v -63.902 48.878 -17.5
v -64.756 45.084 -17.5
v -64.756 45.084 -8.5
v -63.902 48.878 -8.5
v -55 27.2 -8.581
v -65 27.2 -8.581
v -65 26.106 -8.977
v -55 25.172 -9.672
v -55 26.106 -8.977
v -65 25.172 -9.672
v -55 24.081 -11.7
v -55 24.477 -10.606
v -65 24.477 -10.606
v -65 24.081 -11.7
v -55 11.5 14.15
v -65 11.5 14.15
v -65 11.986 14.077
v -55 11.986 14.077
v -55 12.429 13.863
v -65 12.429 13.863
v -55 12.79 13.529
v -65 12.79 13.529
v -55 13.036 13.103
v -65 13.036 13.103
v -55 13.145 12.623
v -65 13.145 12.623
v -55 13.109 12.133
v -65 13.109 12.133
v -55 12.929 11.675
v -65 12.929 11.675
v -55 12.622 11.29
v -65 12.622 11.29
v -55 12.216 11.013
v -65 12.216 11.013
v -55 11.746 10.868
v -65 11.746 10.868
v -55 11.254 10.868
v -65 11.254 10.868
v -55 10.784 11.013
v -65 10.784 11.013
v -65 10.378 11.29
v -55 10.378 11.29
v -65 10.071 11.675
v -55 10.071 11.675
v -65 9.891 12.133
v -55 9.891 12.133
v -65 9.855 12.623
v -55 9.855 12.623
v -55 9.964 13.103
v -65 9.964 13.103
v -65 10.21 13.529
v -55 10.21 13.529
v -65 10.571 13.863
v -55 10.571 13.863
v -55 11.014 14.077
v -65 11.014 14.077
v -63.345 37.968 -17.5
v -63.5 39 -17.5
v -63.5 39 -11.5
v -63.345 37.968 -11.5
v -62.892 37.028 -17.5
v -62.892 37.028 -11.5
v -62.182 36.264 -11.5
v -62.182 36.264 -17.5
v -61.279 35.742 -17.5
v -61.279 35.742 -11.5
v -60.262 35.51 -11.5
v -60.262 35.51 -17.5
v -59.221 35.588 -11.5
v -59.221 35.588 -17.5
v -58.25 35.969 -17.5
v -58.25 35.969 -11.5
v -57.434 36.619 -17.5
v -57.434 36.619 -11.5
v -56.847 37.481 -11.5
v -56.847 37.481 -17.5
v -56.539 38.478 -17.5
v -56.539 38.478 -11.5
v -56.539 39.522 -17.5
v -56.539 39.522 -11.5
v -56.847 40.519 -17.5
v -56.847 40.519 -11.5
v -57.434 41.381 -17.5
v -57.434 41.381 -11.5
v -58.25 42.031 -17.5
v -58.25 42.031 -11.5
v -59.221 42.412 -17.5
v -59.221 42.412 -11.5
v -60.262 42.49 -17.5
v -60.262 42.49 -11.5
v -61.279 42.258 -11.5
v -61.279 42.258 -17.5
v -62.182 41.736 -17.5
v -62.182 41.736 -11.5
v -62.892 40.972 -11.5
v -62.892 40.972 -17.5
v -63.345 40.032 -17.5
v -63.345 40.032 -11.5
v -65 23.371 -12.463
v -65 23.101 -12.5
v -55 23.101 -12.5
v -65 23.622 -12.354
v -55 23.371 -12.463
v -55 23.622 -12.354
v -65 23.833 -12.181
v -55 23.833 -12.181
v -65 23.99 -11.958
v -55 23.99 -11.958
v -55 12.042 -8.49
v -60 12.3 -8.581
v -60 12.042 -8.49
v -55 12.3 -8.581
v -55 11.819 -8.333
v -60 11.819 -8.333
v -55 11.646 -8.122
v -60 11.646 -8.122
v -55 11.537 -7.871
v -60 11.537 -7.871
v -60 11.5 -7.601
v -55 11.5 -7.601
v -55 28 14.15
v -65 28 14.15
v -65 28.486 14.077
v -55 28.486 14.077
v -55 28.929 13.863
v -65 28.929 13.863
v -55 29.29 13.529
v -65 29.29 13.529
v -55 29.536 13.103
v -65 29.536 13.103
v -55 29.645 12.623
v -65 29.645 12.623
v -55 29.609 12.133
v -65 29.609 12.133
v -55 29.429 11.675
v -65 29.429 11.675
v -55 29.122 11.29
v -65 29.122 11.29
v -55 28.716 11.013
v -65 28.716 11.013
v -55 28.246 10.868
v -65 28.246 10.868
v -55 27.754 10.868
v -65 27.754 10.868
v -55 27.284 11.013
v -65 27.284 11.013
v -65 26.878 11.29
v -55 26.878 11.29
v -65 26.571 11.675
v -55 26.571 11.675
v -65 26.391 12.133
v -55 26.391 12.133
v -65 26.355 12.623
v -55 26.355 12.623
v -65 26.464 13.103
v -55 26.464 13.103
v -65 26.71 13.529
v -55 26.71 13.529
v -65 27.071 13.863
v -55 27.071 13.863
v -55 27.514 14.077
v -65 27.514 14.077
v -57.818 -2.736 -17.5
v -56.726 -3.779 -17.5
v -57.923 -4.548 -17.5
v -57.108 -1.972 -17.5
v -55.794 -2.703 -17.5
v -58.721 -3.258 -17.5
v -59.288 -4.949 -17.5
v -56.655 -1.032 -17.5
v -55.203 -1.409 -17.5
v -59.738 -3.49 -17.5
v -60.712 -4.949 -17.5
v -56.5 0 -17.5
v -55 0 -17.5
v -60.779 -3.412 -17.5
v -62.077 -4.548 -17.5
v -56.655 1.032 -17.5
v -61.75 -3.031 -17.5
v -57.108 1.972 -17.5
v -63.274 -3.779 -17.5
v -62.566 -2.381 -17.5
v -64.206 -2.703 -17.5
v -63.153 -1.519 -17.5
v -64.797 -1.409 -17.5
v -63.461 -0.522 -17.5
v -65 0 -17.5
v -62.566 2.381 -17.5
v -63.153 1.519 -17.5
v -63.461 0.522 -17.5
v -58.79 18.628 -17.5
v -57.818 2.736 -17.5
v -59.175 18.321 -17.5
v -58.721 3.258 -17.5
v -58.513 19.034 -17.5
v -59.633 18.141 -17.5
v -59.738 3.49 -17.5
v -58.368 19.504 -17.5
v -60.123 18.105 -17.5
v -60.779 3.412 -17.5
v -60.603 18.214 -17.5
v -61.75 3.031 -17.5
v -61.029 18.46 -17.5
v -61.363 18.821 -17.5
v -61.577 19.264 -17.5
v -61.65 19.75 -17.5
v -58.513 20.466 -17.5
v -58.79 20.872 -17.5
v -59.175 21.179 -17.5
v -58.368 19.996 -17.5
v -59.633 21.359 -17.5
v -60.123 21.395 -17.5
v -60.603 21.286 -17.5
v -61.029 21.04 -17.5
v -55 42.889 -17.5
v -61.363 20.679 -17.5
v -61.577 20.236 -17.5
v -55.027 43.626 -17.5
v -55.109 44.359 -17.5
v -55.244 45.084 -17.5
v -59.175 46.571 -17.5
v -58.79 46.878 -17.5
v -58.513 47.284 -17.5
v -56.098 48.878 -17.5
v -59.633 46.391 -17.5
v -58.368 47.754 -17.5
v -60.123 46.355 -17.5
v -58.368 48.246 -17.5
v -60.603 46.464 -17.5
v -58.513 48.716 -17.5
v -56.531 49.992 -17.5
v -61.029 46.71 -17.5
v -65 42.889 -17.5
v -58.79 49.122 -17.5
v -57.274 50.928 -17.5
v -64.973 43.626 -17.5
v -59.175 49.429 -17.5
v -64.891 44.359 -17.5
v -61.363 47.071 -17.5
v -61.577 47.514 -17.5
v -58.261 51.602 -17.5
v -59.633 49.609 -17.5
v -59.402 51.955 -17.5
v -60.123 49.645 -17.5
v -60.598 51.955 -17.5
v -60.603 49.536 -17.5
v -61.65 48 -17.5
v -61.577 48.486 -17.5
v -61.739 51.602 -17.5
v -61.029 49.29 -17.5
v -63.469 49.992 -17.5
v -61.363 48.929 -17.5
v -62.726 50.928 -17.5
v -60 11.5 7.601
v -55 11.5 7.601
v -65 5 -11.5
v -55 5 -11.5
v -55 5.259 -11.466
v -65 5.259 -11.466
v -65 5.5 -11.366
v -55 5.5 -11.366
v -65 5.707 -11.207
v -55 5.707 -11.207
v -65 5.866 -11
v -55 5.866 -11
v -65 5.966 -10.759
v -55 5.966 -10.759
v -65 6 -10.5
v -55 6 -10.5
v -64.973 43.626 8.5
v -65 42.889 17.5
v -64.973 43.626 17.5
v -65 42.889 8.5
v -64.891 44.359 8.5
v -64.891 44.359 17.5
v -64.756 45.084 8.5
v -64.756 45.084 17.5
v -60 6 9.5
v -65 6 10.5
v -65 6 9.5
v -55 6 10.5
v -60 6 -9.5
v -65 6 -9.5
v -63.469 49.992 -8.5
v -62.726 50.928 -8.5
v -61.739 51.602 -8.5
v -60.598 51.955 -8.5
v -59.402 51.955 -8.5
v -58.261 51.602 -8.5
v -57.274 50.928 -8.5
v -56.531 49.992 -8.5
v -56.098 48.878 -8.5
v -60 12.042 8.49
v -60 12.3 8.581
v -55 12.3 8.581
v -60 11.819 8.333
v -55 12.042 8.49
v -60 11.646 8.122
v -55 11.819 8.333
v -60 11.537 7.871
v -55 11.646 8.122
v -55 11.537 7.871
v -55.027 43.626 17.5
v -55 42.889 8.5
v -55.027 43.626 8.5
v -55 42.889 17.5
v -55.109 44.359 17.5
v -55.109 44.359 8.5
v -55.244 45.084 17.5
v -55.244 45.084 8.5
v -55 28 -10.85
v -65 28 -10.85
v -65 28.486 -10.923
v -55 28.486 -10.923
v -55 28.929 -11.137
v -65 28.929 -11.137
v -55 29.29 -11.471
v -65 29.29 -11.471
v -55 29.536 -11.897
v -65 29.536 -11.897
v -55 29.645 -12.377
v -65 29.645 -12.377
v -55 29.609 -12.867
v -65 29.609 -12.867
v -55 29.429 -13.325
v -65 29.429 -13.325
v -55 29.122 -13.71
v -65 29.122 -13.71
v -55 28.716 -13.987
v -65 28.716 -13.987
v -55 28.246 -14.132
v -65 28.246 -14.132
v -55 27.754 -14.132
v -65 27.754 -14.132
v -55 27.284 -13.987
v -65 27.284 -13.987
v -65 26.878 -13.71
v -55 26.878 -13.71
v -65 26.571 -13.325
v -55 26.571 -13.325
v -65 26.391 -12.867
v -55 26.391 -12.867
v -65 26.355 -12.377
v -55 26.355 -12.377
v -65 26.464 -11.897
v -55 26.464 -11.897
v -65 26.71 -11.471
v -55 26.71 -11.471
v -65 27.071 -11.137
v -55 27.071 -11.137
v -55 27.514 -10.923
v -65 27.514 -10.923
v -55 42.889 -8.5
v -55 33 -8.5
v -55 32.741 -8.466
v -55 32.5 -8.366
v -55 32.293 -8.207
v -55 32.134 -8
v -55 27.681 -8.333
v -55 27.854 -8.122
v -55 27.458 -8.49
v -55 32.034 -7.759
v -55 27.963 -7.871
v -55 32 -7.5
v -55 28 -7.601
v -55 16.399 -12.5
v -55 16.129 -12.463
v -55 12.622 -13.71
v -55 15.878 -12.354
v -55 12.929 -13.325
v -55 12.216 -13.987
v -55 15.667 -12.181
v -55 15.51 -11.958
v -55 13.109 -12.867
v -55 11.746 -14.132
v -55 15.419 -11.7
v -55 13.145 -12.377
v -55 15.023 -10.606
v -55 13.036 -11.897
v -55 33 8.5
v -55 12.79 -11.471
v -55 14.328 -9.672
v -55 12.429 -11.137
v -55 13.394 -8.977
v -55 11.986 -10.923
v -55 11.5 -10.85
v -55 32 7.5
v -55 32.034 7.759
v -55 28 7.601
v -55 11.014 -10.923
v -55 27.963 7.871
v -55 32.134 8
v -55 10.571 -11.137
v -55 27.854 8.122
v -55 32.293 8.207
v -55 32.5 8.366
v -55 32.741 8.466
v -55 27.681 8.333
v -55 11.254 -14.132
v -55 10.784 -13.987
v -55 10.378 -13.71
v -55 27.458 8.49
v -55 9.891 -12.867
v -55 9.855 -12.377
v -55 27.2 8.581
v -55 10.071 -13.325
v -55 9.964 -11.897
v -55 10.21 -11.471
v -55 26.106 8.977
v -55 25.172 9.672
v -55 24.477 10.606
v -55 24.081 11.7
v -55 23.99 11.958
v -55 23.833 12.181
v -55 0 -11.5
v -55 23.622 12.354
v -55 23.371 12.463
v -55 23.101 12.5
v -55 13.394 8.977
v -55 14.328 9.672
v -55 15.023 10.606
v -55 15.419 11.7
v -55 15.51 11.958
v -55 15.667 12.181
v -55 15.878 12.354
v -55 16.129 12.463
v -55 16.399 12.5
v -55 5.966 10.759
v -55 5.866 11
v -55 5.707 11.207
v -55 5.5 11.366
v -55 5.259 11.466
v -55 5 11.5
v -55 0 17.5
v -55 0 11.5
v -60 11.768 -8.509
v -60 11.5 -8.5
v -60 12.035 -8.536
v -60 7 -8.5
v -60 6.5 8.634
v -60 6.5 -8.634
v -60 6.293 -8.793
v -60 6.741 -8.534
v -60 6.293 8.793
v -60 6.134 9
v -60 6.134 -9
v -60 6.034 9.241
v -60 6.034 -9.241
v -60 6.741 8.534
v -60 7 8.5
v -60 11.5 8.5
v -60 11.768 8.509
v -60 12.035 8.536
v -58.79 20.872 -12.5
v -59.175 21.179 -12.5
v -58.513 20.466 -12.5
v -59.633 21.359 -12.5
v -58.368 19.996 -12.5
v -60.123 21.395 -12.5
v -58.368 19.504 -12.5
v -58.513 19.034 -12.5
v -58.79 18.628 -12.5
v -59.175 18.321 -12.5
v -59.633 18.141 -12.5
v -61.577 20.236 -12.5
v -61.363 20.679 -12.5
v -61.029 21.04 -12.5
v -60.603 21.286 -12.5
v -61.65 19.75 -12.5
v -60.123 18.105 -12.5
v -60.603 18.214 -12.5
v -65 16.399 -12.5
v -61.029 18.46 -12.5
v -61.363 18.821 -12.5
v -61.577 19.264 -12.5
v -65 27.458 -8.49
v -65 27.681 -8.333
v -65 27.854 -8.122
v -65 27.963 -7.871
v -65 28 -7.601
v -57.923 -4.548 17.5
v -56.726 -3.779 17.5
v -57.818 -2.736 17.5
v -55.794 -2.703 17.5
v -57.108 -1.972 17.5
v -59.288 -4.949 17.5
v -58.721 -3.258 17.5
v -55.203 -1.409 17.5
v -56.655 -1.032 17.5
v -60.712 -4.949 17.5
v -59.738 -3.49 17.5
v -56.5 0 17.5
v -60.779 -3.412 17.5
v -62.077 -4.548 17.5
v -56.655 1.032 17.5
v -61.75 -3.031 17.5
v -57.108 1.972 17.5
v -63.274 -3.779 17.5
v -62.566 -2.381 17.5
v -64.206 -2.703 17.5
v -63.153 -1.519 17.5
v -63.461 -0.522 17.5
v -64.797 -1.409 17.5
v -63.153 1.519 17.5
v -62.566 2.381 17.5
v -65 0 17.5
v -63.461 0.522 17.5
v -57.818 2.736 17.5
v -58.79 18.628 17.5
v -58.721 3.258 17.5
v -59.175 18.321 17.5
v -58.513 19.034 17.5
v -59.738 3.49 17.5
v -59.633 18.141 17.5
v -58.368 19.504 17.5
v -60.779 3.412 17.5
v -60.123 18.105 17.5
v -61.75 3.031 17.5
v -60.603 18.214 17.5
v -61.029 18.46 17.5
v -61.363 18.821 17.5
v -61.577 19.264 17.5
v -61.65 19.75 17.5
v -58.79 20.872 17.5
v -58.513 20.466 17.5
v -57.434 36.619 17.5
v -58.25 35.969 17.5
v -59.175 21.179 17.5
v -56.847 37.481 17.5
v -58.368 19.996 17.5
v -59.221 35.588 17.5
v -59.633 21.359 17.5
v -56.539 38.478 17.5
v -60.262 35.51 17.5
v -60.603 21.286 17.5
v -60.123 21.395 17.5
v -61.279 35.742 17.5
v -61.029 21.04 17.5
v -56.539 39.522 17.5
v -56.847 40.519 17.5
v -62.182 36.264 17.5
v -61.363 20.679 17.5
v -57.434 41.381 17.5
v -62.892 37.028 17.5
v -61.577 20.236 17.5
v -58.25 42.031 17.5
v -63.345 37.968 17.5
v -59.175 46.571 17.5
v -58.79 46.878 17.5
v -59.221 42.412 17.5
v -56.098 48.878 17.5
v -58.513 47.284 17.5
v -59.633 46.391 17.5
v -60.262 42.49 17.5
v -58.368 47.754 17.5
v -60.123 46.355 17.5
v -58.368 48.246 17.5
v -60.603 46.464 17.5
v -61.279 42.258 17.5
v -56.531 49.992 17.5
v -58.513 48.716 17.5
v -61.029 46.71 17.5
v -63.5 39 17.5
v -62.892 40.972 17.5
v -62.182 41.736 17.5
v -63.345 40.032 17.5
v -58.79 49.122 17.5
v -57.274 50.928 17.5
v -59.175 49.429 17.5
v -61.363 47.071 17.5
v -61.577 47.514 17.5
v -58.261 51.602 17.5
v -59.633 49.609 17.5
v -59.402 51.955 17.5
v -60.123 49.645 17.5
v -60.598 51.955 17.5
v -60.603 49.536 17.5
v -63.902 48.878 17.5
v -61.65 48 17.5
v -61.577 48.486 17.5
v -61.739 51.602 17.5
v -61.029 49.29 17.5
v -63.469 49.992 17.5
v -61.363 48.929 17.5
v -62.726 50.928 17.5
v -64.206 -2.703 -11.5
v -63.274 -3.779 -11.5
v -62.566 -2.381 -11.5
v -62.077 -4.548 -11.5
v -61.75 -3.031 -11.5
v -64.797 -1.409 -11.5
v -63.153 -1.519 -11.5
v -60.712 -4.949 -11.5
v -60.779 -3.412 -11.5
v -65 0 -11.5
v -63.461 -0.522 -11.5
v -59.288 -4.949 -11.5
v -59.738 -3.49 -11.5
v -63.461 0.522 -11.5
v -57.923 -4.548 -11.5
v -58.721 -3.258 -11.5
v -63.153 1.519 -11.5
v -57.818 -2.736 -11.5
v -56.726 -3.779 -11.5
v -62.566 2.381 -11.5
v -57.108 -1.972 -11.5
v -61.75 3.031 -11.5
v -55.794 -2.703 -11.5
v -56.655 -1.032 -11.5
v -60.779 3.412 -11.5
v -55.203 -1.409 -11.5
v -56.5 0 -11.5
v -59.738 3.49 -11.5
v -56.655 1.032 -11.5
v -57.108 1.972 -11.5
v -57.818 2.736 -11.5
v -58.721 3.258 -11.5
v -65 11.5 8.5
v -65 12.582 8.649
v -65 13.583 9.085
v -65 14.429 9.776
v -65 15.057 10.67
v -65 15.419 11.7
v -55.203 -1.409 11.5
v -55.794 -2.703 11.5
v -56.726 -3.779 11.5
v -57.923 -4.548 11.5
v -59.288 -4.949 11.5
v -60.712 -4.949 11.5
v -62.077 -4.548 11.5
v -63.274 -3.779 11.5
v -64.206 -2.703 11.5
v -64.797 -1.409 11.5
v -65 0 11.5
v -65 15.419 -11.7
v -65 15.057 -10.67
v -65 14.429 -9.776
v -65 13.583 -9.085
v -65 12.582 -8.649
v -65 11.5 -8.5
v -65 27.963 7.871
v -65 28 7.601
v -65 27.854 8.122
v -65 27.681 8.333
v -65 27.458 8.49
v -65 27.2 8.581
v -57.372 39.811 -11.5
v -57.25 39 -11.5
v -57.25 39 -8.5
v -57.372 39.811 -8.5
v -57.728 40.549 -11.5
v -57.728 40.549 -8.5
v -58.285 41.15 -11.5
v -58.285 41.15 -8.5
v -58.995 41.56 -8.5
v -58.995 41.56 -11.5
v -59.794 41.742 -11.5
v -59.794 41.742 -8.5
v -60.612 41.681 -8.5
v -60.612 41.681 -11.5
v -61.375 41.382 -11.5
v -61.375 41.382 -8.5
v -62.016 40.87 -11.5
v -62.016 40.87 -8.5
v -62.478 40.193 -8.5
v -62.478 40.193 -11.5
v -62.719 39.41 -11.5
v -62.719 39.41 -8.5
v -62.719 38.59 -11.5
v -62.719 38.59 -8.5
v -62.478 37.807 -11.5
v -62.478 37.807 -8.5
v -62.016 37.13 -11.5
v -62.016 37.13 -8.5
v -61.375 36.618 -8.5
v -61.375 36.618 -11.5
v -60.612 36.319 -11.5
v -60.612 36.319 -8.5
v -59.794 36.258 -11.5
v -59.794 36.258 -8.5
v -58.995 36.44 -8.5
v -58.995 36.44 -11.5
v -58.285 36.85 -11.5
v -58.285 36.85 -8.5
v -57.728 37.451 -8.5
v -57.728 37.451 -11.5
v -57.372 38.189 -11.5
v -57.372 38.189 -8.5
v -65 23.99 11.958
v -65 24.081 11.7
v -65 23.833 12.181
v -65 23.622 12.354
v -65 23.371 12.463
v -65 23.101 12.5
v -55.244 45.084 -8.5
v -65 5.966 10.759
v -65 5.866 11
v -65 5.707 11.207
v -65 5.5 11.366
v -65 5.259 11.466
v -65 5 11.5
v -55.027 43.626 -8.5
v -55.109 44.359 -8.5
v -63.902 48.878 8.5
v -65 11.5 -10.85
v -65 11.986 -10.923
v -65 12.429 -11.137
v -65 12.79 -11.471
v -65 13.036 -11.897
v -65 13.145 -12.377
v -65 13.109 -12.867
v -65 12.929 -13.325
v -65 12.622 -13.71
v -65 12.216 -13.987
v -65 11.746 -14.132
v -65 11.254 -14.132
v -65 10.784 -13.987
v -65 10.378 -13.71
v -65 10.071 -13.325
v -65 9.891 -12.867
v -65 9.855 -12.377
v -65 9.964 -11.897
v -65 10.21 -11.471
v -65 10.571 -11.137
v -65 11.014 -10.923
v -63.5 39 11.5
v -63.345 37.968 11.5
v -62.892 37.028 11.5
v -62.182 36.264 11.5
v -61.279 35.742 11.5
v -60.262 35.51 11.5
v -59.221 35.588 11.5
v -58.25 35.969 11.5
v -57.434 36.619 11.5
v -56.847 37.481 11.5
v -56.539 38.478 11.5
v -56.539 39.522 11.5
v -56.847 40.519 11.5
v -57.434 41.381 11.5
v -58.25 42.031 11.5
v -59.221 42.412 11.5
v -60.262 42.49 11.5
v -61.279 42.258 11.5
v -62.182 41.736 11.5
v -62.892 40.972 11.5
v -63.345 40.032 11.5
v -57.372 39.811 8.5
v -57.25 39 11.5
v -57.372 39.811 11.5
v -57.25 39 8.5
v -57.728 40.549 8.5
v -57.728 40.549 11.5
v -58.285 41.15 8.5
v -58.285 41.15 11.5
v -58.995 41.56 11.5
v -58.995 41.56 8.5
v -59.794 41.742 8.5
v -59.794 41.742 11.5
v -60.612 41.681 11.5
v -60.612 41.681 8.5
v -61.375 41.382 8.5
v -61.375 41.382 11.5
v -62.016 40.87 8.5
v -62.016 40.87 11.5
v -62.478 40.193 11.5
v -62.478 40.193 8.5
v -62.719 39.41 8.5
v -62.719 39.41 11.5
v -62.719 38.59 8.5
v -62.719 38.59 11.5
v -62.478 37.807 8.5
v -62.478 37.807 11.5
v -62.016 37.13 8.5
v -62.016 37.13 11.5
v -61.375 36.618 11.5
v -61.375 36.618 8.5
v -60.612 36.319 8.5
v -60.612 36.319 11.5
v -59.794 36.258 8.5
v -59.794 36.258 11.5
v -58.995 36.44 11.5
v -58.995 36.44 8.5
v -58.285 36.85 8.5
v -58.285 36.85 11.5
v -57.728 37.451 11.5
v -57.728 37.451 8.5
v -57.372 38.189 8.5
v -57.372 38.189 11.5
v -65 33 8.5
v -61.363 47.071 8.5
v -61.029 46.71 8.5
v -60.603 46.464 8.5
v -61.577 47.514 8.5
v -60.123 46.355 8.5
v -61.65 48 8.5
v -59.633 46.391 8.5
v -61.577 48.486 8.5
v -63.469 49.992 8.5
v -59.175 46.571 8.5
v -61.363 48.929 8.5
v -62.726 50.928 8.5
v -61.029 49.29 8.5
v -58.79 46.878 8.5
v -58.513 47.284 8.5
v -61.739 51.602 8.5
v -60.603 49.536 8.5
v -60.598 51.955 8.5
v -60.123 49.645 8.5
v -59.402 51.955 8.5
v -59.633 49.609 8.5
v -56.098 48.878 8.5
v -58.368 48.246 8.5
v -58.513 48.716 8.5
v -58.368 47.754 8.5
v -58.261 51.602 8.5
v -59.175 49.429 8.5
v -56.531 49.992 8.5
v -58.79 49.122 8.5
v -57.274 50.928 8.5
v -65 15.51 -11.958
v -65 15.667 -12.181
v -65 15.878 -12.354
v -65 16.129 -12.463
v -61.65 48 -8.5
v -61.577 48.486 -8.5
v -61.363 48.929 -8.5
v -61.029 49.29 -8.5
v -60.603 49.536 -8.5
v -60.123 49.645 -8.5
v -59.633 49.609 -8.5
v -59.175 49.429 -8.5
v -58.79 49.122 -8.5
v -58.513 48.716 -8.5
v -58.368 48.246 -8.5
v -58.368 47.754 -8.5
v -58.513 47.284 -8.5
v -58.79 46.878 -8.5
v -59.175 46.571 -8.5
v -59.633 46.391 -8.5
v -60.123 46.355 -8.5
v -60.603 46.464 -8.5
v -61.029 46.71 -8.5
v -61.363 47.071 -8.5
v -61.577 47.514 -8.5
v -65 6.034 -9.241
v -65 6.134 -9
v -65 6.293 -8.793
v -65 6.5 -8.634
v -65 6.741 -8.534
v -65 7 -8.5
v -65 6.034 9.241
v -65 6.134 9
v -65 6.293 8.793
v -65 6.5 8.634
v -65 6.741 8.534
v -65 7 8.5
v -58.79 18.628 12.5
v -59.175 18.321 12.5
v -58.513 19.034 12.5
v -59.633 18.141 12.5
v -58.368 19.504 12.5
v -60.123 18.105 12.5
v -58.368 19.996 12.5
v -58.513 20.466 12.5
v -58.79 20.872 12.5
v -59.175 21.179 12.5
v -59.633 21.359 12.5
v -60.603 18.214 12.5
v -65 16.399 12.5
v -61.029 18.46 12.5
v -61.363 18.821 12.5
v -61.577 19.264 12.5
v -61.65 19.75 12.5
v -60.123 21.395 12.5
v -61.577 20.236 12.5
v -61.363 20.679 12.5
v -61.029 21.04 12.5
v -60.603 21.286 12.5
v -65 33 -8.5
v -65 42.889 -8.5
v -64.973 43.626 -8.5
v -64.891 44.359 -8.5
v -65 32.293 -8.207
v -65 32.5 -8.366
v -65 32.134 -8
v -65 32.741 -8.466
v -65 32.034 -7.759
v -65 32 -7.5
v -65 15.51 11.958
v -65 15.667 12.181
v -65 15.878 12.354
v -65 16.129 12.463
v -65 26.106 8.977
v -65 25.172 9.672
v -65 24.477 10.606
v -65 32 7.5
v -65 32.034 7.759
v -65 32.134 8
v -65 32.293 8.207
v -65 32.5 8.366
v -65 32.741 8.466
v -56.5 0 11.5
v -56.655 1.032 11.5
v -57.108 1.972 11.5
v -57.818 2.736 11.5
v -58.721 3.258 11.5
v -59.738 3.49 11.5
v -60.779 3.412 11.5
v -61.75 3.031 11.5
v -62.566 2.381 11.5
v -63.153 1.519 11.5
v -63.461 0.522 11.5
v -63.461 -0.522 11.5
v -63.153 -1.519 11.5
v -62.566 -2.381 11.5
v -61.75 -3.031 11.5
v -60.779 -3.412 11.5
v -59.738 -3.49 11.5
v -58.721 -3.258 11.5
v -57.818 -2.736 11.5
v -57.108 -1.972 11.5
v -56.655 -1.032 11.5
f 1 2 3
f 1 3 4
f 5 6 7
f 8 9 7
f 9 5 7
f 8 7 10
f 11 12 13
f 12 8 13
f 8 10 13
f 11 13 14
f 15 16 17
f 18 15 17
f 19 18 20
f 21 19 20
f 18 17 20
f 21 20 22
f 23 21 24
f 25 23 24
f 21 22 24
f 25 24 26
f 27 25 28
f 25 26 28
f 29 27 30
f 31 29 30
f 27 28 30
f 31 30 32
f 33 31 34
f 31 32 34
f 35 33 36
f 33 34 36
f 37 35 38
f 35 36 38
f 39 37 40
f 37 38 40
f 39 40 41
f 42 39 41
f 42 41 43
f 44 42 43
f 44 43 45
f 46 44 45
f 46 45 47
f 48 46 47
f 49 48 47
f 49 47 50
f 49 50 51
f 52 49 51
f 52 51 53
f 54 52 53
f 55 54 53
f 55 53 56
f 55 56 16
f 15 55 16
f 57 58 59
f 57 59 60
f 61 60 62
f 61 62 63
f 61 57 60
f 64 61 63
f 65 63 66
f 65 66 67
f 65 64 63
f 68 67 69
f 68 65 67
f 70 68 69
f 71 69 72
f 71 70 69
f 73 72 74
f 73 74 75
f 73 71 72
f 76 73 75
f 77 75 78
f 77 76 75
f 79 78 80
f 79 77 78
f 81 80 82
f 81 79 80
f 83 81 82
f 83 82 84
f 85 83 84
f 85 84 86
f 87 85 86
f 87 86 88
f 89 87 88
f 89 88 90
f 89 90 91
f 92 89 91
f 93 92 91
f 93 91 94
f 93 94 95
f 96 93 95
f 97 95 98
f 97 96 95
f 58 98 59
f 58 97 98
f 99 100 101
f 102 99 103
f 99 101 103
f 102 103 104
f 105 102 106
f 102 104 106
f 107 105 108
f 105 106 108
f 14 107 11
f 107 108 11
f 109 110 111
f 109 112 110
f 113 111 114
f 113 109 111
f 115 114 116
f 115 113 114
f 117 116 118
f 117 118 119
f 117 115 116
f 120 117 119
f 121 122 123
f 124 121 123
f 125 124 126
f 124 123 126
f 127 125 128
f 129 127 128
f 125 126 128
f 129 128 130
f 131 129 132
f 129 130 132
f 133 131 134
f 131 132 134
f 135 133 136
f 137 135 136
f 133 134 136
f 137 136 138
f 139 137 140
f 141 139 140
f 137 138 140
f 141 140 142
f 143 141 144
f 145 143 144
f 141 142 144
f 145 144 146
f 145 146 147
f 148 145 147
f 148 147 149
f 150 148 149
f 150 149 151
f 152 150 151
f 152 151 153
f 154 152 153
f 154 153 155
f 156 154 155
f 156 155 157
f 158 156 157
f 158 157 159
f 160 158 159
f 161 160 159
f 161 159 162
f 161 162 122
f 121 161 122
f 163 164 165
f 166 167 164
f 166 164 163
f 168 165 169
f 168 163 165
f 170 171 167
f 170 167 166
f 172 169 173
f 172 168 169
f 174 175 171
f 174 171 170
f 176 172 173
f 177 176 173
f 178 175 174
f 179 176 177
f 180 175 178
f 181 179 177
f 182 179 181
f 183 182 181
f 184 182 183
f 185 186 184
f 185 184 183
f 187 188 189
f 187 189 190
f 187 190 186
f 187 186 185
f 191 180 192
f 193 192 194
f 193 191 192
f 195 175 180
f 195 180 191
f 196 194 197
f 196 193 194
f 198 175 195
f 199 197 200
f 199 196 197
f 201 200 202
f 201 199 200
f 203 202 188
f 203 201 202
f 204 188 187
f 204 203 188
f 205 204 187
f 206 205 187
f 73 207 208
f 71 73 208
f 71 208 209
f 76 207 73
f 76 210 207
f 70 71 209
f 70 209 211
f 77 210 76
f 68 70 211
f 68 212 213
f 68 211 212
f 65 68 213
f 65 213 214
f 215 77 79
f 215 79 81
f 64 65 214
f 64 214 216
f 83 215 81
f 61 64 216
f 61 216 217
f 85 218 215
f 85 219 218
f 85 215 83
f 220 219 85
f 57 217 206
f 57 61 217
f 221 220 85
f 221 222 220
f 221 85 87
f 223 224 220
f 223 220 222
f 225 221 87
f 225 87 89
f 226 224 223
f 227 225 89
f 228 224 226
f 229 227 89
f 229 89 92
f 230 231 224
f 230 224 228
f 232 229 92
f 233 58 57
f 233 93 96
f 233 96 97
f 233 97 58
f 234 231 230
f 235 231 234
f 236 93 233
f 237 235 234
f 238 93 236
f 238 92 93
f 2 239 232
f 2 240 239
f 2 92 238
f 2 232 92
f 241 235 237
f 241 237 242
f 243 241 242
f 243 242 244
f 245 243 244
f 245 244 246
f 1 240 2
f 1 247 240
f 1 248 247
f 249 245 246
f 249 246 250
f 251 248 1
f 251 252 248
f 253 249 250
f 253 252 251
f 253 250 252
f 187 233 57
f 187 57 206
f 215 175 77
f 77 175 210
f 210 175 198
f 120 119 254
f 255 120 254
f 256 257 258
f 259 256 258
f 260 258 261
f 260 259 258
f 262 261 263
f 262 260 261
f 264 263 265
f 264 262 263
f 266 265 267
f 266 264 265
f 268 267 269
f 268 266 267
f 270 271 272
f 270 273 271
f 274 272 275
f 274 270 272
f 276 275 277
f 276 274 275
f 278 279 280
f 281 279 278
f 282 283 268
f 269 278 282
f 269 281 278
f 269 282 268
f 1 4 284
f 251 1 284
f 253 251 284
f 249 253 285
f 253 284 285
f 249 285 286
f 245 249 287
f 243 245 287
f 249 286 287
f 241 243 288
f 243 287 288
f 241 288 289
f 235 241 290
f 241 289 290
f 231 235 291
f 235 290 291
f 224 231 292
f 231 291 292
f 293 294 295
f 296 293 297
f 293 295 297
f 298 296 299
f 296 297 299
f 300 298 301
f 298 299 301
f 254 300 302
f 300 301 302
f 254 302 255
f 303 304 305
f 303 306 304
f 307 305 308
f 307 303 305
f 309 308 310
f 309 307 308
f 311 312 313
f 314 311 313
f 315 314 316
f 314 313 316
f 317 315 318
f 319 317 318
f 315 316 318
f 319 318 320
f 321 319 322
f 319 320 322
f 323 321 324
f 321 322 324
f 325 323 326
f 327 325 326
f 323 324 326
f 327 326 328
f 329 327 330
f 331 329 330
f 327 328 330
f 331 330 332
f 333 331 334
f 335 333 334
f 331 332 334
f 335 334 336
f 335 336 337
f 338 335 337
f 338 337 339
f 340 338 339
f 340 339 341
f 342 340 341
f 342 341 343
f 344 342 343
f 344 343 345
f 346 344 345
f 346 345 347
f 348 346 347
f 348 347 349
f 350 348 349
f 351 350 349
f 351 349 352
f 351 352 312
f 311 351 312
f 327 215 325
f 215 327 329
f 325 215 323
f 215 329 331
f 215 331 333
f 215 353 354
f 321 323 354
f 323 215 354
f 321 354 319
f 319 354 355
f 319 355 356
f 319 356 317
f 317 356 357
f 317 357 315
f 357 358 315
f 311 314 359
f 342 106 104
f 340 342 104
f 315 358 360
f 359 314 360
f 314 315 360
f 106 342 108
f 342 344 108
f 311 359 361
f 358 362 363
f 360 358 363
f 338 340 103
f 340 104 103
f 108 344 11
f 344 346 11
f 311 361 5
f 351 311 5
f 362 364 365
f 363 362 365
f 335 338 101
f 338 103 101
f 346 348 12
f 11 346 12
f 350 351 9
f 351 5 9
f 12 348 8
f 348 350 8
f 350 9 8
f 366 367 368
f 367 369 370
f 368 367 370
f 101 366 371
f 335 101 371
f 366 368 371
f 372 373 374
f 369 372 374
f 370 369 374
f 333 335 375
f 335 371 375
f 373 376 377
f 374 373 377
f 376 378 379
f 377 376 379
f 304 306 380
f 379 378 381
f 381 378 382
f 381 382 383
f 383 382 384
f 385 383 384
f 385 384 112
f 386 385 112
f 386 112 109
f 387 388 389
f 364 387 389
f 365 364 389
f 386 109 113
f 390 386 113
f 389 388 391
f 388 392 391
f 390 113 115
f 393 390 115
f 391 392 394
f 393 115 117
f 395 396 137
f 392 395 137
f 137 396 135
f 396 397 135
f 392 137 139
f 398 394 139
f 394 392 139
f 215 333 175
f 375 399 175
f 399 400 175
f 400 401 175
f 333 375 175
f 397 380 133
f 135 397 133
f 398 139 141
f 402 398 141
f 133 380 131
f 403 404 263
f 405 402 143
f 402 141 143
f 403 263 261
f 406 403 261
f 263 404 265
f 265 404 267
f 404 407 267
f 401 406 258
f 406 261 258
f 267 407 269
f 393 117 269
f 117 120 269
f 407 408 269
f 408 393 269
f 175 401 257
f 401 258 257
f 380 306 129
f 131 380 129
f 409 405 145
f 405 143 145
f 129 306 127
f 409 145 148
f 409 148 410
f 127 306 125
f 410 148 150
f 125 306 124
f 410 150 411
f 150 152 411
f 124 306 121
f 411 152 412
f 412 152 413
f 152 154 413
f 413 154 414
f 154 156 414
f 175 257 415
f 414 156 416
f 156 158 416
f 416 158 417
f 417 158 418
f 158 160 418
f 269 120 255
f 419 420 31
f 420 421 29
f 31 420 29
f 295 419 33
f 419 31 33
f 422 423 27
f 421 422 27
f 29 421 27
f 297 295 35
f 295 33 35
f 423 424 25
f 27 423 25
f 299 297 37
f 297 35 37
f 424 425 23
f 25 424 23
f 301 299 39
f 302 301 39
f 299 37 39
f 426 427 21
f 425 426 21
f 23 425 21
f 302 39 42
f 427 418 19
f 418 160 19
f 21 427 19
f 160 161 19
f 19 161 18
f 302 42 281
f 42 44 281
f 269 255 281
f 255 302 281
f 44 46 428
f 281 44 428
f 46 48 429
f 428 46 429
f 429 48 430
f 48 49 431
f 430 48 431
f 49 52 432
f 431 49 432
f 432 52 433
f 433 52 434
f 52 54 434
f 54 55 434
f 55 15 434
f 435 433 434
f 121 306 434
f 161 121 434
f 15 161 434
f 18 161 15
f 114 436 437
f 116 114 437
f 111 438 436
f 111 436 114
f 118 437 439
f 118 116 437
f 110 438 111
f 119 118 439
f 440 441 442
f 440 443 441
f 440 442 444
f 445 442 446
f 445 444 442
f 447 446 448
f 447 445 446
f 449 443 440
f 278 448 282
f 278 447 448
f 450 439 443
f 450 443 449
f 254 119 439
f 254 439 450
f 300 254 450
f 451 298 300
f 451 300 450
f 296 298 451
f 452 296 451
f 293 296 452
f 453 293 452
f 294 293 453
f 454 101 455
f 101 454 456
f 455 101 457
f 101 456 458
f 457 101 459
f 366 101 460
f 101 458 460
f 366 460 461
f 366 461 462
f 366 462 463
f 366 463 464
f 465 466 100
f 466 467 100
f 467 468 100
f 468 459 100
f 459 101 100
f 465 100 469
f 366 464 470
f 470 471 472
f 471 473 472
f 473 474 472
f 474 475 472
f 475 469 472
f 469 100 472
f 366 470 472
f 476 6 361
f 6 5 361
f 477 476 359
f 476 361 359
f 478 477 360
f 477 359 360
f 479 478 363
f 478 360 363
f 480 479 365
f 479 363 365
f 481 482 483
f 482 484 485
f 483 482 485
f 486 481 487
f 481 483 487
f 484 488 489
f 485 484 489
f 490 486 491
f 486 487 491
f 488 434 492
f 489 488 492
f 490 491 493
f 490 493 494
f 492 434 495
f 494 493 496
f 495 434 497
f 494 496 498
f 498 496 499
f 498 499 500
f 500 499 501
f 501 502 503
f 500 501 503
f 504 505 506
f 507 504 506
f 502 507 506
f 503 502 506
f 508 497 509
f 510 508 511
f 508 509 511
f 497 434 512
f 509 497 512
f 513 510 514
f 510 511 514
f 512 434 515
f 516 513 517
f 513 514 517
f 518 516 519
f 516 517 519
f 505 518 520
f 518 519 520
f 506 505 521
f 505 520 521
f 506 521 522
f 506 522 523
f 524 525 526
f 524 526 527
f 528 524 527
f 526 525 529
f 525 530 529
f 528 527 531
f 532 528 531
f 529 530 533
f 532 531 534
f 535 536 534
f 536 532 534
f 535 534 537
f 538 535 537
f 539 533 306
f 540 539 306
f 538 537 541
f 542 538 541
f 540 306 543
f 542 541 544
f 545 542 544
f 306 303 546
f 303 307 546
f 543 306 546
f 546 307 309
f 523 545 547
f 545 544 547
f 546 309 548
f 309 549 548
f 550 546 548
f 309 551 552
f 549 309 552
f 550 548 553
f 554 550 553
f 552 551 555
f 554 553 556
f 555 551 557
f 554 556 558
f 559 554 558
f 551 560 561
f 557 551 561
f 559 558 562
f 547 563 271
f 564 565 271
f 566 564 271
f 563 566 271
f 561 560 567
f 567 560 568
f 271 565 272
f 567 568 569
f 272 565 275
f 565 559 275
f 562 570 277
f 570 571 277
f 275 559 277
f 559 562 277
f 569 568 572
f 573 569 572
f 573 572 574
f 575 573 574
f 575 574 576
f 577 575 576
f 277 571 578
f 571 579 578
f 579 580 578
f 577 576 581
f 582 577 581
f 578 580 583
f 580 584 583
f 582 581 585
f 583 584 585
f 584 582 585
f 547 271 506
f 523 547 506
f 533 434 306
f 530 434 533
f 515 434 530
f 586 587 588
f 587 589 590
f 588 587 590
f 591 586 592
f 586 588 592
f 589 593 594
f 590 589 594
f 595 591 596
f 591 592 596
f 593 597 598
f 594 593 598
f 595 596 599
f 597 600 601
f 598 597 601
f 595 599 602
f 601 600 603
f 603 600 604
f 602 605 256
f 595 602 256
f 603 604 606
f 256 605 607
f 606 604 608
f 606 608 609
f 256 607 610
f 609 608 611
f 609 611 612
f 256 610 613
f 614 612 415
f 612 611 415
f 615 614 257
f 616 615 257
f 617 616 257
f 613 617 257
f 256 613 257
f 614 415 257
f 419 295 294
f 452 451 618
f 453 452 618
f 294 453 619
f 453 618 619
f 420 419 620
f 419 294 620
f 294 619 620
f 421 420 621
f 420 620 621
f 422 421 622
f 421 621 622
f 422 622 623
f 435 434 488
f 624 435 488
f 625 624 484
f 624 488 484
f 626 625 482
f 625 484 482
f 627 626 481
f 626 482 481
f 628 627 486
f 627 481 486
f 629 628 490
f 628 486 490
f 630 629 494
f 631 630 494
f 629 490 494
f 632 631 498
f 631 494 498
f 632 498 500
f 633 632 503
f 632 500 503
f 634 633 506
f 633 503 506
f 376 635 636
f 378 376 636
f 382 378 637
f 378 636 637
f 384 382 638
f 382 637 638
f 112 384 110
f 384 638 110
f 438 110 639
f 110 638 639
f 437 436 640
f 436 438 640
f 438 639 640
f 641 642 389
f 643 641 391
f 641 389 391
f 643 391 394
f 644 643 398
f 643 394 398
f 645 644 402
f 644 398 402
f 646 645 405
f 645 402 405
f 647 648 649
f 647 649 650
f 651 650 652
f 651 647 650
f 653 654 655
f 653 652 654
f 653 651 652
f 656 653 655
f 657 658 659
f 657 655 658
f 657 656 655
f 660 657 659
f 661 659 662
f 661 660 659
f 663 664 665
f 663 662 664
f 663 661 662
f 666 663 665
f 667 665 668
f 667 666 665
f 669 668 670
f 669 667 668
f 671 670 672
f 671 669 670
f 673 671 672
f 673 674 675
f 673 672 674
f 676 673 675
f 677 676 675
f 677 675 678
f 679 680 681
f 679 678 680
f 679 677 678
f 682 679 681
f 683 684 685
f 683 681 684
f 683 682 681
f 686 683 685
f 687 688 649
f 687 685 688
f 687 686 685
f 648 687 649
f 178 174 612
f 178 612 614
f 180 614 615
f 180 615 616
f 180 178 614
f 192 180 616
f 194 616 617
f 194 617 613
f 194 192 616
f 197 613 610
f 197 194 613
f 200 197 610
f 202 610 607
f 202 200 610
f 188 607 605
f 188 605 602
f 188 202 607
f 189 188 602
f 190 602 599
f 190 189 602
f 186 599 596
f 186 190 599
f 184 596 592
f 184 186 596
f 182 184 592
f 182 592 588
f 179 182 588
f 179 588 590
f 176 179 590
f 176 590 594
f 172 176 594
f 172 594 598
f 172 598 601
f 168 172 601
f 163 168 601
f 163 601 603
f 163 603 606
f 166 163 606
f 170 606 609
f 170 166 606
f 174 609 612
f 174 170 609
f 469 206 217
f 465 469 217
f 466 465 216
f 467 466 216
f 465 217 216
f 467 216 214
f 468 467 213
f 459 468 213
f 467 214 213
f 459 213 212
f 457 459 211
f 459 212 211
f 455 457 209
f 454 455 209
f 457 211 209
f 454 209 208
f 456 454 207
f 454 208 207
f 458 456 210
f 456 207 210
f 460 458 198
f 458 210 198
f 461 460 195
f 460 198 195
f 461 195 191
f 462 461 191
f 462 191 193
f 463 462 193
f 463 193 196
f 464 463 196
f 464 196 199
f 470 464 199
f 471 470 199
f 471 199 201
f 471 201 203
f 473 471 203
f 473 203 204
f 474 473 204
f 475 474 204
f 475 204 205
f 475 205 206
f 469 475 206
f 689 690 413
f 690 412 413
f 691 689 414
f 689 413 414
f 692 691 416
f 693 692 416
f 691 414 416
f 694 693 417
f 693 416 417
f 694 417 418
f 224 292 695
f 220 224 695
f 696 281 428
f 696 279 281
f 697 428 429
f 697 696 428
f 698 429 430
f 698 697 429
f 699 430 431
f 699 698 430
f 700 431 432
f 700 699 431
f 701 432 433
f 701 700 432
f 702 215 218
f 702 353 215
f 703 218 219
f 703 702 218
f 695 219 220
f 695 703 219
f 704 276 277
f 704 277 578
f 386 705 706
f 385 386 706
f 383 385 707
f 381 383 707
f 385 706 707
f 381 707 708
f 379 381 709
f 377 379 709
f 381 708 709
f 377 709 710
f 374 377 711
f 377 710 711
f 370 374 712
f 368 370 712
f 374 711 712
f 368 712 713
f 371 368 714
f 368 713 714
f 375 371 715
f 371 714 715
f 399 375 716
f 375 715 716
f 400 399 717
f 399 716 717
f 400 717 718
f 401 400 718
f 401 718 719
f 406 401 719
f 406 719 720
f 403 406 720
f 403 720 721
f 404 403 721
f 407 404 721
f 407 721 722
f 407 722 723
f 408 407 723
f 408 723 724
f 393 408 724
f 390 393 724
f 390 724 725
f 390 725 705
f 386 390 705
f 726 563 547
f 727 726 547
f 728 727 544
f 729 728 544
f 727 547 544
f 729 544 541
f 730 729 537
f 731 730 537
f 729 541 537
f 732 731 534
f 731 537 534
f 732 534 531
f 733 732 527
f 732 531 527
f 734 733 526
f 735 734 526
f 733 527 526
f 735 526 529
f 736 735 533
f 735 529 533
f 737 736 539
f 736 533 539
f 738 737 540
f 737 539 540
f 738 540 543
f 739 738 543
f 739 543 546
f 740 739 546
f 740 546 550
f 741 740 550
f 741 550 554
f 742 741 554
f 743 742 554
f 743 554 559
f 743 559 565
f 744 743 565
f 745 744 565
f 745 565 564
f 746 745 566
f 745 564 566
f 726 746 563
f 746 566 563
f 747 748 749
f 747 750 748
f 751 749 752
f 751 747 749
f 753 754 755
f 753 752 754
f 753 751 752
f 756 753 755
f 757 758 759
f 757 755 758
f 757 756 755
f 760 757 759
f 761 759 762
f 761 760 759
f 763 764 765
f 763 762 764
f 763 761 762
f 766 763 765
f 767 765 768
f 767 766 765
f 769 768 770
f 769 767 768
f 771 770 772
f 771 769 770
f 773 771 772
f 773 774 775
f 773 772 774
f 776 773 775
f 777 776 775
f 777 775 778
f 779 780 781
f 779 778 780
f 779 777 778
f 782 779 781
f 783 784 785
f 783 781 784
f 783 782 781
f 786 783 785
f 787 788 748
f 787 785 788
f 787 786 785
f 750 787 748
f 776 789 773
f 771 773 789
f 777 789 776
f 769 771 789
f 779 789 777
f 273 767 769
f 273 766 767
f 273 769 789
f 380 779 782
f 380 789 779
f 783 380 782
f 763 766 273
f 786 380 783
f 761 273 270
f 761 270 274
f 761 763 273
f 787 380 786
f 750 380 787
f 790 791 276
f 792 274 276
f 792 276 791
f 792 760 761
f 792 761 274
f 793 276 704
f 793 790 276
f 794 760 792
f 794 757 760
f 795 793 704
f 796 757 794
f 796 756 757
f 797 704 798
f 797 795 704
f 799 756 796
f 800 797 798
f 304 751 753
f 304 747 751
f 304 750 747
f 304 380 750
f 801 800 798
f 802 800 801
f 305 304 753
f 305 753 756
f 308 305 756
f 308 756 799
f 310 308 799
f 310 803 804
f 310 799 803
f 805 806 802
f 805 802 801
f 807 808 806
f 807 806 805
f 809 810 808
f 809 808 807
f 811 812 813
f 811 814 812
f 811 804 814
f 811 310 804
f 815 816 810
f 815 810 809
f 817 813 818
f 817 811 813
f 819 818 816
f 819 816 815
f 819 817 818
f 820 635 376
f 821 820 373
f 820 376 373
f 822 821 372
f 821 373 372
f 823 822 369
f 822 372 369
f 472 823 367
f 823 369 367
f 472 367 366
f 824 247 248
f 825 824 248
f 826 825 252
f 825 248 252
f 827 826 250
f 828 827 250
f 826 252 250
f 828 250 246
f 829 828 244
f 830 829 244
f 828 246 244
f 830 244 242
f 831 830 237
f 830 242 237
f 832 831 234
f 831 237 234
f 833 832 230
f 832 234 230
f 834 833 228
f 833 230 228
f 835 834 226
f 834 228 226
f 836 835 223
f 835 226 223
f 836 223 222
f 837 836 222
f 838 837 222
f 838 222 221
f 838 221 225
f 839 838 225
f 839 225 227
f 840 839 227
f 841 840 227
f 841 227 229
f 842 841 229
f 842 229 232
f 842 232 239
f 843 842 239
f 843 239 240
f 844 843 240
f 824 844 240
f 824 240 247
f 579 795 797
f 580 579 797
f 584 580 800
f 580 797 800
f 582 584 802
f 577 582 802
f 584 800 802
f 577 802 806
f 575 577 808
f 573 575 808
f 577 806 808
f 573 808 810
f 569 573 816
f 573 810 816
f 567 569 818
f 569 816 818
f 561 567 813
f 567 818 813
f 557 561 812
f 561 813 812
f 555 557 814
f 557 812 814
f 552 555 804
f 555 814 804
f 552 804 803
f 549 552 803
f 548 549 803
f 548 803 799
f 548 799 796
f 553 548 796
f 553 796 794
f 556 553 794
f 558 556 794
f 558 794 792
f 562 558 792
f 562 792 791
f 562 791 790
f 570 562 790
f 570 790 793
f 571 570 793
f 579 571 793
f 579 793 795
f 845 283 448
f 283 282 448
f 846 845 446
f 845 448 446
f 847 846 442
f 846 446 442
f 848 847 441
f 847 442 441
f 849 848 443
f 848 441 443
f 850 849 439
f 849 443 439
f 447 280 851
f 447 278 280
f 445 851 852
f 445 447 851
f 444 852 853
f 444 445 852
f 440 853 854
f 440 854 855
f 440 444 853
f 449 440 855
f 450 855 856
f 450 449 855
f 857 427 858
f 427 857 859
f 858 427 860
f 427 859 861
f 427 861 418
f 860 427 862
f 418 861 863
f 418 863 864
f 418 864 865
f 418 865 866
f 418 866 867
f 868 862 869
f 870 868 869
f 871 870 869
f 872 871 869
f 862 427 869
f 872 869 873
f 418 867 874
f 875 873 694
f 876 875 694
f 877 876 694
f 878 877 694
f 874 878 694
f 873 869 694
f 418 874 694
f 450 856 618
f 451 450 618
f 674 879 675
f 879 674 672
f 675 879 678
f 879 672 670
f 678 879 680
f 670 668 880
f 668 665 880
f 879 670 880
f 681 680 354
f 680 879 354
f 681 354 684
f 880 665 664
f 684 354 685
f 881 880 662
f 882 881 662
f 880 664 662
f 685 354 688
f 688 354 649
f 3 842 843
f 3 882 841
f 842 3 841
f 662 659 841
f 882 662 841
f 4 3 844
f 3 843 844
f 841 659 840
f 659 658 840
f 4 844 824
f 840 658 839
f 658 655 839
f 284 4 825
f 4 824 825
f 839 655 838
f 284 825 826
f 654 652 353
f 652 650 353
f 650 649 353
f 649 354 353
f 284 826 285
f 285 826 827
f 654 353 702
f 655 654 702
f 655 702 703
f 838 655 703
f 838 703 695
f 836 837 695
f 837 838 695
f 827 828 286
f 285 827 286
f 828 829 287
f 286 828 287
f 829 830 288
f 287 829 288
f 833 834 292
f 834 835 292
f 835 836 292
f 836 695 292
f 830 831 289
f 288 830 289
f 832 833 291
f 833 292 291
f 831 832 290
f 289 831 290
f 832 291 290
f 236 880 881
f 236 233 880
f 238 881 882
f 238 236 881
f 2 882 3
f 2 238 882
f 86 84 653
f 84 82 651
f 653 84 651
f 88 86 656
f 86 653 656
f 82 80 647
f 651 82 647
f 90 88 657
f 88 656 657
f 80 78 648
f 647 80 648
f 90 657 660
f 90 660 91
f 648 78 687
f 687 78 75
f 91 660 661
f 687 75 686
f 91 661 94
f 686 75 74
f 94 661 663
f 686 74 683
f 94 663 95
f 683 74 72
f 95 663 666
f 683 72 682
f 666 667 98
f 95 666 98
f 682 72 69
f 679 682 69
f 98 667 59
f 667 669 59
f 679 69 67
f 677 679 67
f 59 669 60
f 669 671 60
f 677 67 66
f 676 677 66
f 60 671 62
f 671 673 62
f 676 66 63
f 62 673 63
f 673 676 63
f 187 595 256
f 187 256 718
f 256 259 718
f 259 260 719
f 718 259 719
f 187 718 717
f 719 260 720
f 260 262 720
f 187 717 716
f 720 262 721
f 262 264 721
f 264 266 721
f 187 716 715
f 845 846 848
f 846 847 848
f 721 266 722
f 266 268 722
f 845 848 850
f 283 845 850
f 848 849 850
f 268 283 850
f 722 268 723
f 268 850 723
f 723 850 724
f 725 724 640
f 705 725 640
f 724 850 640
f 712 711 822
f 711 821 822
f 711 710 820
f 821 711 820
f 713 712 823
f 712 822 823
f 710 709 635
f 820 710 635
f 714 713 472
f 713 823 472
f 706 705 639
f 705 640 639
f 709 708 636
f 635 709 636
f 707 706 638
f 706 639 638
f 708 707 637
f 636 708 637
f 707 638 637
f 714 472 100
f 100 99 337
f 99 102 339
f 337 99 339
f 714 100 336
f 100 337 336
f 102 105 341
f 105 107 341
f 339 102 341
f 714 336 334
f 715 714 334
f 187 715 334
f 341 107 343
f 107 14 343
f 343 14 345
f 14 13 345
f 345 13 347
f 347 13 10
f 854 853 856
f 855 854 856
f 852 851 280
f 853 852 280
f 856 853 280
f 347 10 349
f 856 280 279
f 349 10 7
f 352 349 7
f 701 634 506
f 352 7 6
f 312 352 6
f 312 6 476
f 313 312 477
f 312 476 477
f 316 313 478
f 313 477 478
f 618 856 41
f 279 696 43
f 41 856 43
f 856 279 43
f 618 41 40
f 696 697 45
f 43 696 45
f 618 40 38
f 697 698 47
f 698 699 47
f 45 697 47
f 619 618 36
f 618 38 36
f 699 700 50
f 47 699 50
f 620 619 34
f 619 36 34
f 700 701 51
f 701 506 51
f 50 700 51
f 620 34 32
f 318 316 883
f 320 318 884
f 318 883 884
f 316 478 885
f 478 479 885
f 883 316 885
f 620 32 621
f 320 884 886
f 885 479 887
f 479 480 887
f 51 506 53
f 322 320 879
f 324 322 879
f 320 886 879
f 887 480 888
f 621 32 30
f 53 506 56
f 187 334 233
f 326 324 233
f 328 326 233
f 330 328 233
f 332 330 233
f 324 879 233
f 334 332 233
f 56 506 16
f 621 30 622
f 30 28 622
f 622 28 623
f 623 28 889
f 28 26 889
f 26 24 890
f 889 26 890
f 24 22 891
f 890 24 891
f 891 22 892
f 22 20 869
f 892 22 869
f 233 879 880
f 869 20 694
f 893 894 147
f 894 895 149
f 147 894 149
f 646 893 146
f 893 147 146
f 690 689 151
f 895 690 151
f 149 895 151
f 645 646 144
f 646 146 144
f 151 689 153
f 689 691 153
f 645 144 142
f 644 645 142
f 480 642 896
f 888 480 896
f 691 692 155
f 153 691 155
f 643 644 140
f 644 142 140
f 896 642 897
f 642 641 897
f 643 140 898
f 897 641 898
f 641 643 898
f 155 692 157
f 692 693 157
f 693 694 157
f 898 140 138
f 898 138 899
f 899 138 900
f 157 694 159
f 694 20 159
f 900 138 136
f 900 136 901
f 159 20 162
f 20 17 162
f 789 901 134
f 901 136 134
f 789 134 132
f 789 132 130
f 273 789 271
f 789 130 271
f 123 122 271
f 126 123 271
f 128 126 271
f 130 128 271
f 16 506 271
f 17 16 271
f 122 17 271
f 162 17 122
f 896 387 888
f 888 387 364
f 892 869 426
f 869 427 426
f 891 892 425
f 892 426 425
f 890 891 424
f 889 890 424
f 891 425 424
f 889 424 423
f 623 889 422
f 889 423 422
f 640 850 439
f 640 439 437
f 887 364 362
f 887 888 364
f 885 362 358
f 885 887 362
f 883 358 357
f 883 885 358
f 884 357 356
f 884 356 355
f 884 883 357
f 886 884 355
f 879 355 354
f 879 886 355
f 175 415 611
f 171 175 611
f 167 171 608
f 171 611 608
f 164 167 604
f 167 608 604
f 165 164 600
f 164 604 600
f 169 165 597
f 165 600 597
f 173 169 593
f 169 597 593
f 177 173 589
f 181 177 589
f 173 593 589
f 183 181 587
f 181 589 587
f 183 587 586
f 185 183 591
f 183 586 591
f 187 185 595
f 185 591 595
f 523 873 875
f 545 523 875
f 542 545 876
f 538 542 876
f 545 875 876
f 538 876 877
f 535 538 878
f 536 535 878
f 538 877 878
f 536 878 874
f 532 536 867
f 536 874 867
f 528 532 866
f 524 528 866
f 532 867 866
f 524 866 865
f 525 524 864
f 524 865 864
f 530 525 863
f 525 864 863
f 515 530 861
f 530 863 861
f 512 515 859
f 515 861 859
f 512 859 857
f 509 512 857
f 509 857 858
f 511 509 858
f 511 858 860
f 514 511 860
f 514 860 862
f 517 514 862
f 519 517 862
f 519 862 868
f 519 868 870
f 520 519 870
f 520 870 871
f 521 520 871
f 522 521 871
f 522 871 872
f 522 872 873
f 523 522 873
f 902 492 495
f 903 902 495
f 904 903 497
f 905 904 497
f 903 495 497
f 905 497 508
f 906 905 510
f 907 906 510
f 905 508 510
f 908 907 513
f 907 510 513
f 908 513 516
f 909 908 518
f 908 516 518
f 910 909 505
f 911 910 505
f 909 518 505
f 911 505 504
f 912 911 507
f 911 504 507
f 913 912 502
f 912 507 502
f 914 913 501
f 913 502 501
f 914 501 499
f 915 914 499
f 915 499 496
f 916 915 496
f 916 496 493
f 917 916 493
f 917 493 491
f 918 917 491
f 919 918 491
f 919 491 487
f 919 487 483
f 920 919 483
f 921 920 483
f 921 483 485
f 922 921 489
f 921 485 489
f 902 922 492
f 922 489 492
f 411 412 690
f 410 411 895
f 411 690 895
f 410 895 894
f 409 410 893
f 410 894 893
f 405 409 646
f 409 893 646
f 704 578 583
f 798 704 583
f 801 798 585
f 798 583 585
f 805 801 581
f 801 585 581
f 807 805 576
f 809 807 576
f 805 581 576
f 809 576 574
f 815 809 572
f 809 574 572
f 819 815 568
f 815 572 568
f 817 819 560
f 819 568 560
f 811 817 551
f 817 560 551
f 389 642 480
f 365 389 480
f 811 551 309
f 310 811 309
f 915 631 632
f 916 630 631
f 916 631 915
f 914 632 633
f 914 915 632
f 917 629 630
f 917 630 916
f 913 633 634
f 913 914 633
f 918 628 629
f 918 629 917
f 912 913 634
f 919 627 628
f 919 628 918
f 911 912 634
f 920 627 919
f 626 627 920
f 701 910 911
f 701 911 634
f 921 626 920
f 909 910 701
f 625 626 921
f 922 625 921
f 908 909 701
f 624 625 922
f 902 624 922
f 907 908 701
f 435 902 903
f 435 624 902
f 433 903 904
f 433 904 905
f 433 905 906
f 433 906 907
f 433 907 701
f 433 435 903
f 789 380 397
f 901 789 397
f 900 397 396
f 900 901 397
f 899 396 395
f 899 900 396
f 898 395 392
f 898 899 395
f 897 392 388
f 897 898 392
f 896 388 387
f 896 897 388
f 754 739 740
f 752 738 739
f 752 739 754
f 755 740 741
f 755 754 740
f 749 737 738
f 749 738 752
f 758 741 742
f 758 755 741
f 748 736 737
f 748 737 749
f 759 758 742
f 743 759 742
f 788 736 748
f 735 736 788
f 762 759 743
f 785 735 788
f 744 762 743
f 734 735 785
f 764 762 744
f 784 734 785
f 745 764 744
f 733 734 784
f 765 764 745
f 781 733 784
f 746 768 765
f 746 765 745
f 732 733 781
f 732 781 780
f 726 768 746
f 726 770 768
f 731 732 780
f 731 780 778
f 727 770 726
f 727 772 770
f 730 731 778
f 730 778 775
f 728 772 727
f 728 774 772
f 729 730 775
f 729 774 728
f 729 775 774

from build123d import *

# Parameters (mm, degrees)
SKETCH_2_R          = 2.750000000000002
SKETCH_2_R_2        = 2.7500000000000018
EXTRUDE_1_DEPTH     = 17.5
SKETCH_8_W          = 23
SKETCH_8_H          = 10.999999999999996
SKETCH_8_W_2        = 17
SKETCH_8_H_2        = 19.999999999999993
CUT_EXTRUDE_2_DEPTH = 56.76961538328914
SKETCH_3_R          = 3.5000000000000004
SKETCH_3_R_2        = 3.500000000000001
CUT_EXTRUDE_1_DEPTH = 6
HOLE_WIZARD_M4_1_D  = 3.3
CUT_EXTRUDE_3_DEPTH = 56.76961538328914
HOLE_WIZARD_M4_2_D  = 3.3
SKETCH_15_W         = 17
SKETCH_15_H         = 5.4999999999999325
CUT_EXTRUDE_5_DEPTH = 5
FILLET_1_R          = 1
FILLET_2_R          = 10


with BuildPart() as part:
    # 草图2 → 凸台-拉伸1 (new, symmetric)
    with BuildSketch(Plane.XY):
        with BuildLine():
            Line((-65, -6.94e-15), (-65, 44.000000000000014))
            Line((-65, 44.000000000000014), (-63.90243902439025, 48.878048780487816))
            ThreePointArc((-63.90243902439025, 48.878048780487816), (-59.99999999999999, 52.00000000000001), (-56.09756097560975, 48.87804878048781))
            Line((-56.09756097560975, 48.87804878048781), (-55.00000000000001, 44.000000000000014))
            Line((-55.00000000000001, 44.000000000000014), (-55.00000000000001, -6.33e-15))
            ThreePointArc((-55.00000000000001, -6.33e-15), (-60, -5.000000000000007), (-65, -6.94e-15))
        make_face()
        with Locations((-60, 38.999999999999986)):
            Circle(SKETCH_2_R, mode=Mode.SUBTRACT)
        with Locations((-60, -6.94e-15)):
            Circle(SKETCH_2_R_2, mode=Mode.SUBTRACT)
    extrude(amount=EXTRUDE_1_DEPTH, both=True)

    # 草图8 → 切除-拉伸2 (cut, through all)
    with BuildSketch(Plane(origin=(-55.00000000000001, 0, 0), x_dir=(0, 0, -1), z_dir=(1, 1.8e-16, 0))):
        with Locations((0, 0.5000000000000178)):
            Rectangle(SKETCH_8_W, SKETCH_8_H)
        with Locations((0, 42.000000000000014)):
            Rectangle(SKETCH_8_W_2, SKETCH_8_H_2)
    extrude(amount=-CUT_EXTRUDE_2_DEPTH, mode=Mode.SUBTRACT)

    # 草图3 → 切除-拉伸1 (cut)
    with BuildSketch(Plane.XY.offset(17.5)):
        with Locations((-60, -6.94e-15)):
            Circle(SKETCH_3_R)
        with Locations(Location((-60, 38.999999999999986, 0), (0, 0, 180))):
            Circle(SKETCH_3_R_2)
    cut_extrude_1 = extrude(amount=-CUT_EXTRUDE_1_DEPTH, mode=Mode.SUBTRACT)

    # M4 螺纹孔1 (through all)
    with Locations(Plane(origin=(-55.00000000000001, 0, 0), x_dir=(0, 0, -1), z_dir=(1, 1.8e-16, 0))):
        with Locations((-12.5, 11.5), (12.5, 11.5), (-12.5, 28), (12.5, 28)):
            Hole(HOLE_WIZARD_M4_1_D / 2)

    # 镜向1: 切除-拉伸1 across plane
    add(cut_extrude_1.mirror(Plane.XY), mode=Mode.SUBTRACT)

    # 草图11 → 切除-拉伸3 (cut, through all)
    with BuildSketch(Plane.ZY.offset(65)):
        with BuildLine():
            Line((-12.5, 23.99999999999997), (-12.5, 15.499999999999966))
            ThreePointArc((-12.5, 15.499999999999966), (-9.67157287525381, 14.328427124746156), (-8.5, 11.499999999999966))
            Line((-8.5, 11.499999999999966), (8.5, 11.499999999999966))
            ThreePointArc((8.5, 11.499999999999966), (9.67157287525381, 14.328427124746156), (12.5, 15.499999999999966))
            Line((12.5, 15.499999999999966), (12.5, 23.99999999999997))
            ThreePointArc((12.5, 23.99999999999997), (9.671572875253812, 25.171572875253784), (8.500000000000004, 27.99999999999997))
            Line((8.500000000000004, 27.99999999999997), (-8.500000000000004, 27.99999999999997))
            ThreePointArc((-8.500000000000004, 27.99999999999997), (-9.671572875253812, 25.171572875253784), (-12.5, 23.99999999999997))
        make_face()
    extrude(amount=-CUT_EXTRUDE_3_DEPTH, mode=Mode.SUBTRACT)

    # M4 螺纹孔2 (through all)
    with Locations(Plane.XY.offset(17.5)):
        with Locations((-60, 19.75), (-60, 48)):
            Hole(HOLE_WIZARD_M4_2_D / 2)

    # 草图15 → 切除-拉伸5 (cut)
    with BuildSketch(Plane.ZY.offset(65)):
        with Locations((0, 8.75)):
            Rectangle(SKETCH_15_W, SKETCH_15_H)
    extrude(amount=-CUT_EXTRUDE_5_DEPTH, mode=Mode.SUBTRACT)

    # 圆角1
    fillet_1_edges = [part.edges().sort_by_distance(p)[0] for p in [
        (-57.5, 11.499999999999968, -8.5),
        (-60, 15.499999999999966, -12.5),
        (-60, 23.99999999999997, -12.5),
        (-60, 27.99999999999997, -8.500000000000002),
        (-60, 27.99999999999997, 8.500000000000002),
        (-60, 23.99999999999997, 12.5),
        (-60, 15.499999999999966, 12.5),
        (-57.5, 11.499999999999968, 8.5),
        (-62.5, 6.000000000000034, -8.5),
        (-62.5, 6.000000000000034, 8.5),
        (-60, 6.000000000000015, -11.5),
        (-60, 6.000000000000015, 11.5),
        (-60.00000000000001, 32.000000000000014, 8.5),
        (-60.00000000000001, 32.000000000000014, -8.5),
    ]]
    fillet(fillet_1_edges, radius=FILLET_1_R)

    # 圆角2
    fillet_2_edges = [part.edges().sort_by_distance(p)[0] for p in [
        (-55.00000000000001, 44.000000000000014, 13),
        (-65, 44.000000000000014, 13),
        (-55.00000000000001, 44.000000000000014, -13),
        (-65, 44.000000000000014, -13),
    ]]
    fillet(fillet_2_edges, radius=FILLET_2_R)


solid = part.part
